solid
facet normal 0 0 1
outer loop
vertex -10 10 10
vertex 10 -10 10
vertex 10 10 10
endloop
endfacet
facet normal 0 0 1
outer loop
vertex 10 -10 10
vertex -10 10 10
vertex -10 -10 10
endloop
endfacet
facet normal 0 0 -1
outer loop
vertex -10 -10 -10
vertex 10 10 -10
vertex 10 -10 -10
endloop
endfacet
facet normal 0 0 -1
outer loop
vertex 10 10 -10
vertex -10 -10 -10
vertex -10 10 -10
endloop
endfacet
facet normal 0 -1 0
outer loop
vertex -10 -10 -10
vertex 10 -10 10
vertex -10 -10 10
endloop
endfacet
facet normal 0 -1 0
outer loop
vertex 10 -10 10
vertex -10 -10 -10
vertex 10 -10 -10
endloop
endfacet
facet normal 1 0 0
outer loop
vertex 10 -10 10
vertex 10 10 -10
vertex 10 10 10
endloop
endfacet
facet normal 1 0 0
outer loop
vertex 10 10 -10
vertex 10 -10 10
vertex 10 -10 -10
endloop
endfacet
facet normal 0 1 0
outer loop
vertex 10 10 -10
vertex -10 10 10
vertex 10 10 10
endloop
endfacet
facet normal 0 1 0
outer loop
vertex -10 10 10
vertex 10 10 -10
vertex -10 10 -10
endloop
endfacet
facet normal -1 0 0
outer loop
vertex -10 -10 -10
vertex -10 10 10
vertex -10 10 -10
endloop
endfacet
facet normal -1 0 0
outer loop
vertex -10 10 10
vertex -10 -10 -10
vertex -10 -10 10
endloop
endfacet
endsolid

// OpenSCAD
// 20mm Square Box
// A simple cubic box with 20mm dimensions

cube([20, 20, 20], center = true);
